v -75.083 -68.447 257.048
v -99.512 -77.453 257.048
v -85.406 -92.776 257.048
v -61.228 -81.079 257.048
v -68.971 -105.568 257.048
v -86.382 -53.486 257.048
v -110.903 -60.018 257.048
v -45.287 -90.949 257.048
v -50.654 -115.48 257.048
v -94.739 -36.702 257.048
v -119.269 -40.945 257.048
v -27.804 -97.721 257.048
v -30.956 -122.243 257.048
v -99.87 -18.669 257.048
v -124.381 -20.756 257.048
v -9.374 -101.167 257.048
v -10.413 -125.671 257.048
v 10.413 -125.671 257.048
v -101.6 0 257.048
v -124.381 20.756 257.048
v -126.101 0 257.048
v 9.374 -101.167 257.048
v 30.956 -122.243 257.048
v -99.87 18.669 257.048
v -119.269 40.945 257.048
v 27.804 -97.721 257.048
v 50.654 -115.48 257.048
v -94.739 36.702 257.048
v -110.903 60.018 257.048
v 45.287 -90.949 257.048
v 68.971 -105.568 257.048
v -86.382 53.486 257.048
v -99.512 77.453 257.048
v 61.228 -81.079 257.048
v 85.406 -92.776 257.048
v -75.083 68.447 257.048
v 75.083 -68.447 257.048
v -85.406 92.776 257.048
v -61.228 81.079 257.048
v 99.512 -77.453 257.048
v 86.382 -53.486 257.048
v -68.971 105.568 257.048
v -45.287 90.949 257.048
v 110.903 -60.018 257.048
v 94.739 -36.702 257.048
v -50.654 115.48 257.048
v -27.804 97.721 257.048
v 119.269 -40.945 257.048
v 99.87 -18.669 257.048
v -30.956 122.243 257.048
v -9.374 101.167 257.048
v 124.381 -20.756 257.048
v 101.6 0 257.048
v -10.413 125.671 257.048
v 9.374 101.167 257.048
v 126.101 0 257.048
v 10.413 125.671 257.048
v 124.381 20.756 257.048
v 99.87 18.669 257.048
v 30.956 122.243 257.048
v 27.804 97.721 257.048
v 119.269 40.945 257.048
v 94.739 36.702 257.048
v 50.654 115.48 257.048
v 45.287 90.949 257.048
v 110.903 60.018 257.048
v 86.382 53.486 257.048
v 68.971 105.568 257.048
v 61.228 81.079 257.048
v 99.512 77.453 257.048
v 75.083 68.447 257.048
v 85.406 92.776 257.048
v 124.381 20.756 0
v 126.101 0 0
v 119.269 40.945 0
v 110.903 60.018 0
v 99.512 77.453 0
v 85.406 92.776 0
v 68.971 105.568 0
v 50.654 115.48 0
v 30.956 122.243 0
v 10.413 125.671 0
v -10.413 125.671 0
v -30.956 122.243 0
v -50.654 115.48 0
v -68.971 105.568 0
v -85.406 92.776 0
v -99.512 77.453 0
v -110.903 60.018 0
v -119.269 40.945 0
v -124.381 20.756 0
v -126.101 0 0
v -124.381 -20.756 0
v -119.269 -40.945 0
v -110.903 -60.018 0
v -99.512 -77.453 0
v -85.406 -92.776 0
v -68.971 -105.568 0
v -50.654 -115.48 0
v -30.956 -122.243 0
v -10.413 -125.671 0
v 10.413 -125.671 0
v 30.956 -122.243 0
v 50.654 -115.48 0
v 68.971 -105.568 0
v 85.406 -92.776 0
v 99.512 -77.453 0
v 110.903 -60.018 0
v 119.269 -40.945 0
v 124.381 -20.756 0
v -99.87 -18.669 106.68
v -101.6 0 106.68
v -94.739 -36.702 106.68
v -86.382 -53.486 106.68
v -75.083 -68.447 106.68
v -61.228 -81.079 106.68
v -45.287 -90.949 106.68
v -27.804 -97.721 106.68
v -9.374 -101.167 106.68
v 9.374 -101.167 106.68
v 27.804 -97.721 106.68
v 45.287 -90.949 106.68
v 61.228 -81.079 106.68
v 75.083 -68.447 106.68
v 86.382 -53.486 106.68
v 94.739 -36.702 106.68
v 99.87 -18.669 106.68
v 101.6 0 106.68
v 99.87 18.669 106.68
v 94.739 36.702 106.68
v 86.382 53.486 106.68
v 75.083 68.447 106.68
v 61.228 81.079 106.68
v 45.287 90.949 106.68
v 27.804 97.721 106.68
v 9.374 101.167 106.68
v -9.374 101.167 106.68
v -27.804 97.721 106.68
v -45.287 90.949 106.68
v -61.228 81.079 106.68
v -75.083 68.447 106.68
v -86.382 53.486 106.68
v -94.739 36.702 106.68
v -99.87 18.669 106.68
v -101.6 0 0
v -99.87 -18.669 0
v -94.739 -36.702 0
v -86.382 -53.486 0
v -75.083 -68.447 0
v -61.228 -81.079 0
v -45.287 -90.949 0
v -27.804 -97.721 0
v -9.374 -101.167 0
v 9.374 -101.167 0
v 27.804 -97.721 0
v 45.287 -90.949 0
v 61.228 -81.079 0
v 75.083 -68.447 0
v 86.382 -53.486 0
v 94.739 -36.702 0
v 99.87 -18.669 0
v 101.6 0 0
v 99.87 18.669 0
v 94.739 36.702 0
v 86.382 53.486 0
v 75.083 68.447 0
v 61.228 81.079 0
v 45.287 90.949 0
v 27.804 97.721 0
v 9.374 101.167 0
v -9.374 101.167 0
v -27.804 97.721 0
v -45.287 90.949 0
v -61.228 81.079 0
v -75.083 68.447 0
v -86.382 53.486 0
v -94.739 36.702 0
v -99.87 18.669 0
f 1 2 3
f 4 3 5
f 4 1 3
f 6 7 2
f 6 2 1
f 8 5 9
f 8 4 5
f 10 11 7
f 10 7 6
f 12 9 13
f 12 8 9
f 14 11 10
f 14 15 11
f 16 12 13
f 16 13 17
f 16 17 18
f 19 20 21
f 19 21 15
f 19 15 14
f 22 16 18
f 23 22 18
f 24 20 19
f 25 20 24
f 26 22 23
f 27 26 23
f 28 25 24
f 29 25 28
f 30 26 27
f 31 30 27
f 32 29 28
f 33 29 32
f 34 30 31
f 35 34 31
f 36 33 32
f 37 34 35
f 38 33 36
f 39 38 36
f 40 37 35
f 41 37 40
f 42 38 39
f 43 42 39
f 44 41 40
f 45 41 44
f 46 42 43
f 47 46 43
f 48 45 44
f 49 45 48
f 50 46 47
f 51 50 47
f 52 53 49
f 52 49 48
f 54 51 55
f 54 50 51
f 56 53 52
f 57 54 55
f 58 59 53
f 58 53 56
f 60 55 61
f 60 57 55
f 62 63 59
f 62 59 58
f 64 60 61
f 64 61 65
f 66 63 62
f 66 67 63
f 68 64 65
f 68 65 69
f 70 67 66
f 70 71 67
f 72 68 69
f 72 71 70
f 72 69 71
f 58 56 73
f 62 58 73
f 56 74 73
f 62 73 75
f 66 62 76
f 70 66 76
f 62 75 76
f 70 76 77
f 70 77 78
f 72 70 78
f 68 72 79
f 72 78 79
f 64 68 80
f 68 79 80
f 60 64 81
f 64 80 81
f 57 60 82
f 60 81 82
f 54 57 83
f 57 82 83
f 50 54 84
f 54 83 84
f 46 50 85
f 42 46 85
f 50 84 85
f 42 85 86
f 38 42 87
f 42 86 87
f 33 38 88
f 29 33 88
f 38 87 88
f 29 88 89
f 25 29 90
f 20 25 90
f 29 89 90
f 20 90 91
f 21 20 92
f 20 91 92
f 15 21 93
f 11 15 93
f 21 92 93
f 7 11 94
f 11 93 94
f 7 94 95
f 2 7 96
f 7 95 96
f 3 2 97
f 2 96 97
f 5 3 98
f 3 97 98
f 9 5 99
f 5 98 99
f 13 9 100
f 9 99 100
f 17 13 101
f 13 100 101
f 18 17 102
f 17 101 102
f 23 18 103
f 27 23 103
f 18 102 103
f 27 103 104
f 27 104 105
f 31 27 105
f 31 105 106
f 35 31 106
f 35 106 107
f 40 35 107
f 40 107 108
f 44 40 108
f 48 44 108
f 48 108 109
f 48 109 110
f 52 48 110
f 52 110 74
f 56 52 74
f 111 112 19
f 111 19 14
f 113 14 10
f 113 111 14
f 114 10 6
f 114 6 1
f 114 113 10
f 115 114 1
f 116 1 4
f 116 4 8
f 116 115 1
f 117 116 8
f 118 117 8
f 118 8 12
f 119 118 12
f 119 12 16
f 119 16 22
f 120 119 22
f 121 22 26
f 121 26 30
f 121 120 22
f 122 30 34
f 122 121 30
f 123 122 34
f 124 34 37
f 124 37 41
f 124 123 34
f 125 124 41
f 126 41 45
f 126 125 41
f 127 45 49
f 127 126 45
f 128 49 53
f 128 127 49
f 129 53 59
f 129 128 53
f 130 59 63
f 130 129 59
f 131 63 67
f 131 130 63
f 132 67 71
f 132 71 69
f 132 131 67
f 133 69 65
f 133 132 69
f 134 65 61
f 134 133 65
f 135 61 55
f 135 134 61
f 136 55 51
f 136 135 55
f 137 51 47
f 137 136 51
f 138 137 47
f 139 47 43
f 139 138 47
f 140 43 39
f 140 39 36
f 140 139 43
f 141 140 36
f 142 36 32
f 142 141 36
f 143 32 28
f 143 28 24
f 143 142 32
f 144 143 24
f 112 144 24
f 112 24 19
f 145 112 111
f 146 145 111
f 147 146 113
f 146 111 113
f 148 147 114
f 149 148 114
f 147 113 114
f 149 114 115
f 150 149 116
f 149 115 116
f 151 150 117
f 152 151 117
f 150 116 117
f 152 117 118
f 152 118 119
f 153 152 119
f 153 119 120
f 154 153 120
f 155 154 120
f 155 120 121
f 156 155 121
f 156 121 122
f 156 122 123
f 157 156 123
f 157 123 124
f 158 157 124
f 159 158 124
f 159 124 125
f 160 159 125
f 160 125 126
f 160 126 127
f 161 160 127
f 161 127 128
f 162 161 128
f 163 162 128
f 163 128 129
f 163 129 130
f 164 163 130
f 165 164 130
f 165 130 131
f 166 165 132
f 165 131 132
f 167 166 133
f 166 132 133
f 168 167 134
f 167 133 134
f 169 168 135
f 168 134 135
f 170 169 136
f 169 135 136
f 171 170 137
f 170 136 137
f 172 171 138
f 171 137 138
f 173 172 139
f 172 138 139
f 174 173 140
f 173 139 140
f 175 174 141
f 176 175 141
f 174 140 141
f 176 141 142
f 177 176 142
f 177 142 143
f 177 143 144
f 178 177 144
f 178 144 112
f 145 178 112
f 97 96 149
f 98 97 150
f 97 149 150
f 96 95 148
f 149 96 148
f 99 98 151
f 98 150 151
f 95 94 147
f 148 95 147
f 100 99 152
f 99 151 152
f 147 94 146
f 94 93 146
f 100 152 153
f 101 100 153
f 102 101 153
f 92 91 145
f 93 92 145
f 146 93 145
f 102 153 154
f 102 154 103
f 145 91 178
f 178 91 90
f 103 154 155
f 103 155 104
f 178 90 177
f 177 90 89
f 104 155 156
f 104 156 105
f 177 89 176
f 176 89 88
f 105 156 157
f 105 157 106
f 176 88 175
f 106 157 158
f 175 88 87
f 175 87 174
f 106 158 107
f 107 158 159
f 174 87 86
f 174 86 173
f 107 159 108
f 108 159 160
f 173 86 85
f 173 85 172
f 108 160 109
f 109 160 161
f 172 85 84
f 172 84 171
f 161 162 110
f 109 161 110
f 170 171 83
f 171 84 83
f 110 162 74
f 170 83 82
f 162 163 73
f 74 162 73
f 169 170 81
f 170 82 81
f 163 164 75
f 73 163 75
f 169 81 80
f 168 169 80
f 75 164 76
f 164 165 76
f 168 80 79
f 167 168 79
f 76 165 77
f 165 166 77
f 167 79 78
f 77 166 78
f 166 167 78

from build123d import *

# Parameters (mm, degrees)
F0_R     = 126.1012102306
F1_DEPTH = 106.68
F2_D     = 203.2
F3_DEPTH = 150.368


with BuildPart() as f1:
    # F0 (on Top) → F1 (new body)
    with BuildSketch(Plane.XY):
        Circle(F0_R)
    extrude(amount=F1_DEPTH)

    # F2 (through all)
    with Locations(Plane(origin=(0, 0, 0), x_dir=(1, 0, 0), z_dir=(0, 0, -1))):
        with Locations((0, 0)):
            Hole(F2_D / 2)

    # F3 (add): a face of the model
    f3_faces = [f1.faces().sort_by_distance(p)[0] for p in [
        (-122.5345293958, 0, 106.68),
    ]]
    extrude(f3_faces, amount=F3_DEPTH)


solid = f1.part
